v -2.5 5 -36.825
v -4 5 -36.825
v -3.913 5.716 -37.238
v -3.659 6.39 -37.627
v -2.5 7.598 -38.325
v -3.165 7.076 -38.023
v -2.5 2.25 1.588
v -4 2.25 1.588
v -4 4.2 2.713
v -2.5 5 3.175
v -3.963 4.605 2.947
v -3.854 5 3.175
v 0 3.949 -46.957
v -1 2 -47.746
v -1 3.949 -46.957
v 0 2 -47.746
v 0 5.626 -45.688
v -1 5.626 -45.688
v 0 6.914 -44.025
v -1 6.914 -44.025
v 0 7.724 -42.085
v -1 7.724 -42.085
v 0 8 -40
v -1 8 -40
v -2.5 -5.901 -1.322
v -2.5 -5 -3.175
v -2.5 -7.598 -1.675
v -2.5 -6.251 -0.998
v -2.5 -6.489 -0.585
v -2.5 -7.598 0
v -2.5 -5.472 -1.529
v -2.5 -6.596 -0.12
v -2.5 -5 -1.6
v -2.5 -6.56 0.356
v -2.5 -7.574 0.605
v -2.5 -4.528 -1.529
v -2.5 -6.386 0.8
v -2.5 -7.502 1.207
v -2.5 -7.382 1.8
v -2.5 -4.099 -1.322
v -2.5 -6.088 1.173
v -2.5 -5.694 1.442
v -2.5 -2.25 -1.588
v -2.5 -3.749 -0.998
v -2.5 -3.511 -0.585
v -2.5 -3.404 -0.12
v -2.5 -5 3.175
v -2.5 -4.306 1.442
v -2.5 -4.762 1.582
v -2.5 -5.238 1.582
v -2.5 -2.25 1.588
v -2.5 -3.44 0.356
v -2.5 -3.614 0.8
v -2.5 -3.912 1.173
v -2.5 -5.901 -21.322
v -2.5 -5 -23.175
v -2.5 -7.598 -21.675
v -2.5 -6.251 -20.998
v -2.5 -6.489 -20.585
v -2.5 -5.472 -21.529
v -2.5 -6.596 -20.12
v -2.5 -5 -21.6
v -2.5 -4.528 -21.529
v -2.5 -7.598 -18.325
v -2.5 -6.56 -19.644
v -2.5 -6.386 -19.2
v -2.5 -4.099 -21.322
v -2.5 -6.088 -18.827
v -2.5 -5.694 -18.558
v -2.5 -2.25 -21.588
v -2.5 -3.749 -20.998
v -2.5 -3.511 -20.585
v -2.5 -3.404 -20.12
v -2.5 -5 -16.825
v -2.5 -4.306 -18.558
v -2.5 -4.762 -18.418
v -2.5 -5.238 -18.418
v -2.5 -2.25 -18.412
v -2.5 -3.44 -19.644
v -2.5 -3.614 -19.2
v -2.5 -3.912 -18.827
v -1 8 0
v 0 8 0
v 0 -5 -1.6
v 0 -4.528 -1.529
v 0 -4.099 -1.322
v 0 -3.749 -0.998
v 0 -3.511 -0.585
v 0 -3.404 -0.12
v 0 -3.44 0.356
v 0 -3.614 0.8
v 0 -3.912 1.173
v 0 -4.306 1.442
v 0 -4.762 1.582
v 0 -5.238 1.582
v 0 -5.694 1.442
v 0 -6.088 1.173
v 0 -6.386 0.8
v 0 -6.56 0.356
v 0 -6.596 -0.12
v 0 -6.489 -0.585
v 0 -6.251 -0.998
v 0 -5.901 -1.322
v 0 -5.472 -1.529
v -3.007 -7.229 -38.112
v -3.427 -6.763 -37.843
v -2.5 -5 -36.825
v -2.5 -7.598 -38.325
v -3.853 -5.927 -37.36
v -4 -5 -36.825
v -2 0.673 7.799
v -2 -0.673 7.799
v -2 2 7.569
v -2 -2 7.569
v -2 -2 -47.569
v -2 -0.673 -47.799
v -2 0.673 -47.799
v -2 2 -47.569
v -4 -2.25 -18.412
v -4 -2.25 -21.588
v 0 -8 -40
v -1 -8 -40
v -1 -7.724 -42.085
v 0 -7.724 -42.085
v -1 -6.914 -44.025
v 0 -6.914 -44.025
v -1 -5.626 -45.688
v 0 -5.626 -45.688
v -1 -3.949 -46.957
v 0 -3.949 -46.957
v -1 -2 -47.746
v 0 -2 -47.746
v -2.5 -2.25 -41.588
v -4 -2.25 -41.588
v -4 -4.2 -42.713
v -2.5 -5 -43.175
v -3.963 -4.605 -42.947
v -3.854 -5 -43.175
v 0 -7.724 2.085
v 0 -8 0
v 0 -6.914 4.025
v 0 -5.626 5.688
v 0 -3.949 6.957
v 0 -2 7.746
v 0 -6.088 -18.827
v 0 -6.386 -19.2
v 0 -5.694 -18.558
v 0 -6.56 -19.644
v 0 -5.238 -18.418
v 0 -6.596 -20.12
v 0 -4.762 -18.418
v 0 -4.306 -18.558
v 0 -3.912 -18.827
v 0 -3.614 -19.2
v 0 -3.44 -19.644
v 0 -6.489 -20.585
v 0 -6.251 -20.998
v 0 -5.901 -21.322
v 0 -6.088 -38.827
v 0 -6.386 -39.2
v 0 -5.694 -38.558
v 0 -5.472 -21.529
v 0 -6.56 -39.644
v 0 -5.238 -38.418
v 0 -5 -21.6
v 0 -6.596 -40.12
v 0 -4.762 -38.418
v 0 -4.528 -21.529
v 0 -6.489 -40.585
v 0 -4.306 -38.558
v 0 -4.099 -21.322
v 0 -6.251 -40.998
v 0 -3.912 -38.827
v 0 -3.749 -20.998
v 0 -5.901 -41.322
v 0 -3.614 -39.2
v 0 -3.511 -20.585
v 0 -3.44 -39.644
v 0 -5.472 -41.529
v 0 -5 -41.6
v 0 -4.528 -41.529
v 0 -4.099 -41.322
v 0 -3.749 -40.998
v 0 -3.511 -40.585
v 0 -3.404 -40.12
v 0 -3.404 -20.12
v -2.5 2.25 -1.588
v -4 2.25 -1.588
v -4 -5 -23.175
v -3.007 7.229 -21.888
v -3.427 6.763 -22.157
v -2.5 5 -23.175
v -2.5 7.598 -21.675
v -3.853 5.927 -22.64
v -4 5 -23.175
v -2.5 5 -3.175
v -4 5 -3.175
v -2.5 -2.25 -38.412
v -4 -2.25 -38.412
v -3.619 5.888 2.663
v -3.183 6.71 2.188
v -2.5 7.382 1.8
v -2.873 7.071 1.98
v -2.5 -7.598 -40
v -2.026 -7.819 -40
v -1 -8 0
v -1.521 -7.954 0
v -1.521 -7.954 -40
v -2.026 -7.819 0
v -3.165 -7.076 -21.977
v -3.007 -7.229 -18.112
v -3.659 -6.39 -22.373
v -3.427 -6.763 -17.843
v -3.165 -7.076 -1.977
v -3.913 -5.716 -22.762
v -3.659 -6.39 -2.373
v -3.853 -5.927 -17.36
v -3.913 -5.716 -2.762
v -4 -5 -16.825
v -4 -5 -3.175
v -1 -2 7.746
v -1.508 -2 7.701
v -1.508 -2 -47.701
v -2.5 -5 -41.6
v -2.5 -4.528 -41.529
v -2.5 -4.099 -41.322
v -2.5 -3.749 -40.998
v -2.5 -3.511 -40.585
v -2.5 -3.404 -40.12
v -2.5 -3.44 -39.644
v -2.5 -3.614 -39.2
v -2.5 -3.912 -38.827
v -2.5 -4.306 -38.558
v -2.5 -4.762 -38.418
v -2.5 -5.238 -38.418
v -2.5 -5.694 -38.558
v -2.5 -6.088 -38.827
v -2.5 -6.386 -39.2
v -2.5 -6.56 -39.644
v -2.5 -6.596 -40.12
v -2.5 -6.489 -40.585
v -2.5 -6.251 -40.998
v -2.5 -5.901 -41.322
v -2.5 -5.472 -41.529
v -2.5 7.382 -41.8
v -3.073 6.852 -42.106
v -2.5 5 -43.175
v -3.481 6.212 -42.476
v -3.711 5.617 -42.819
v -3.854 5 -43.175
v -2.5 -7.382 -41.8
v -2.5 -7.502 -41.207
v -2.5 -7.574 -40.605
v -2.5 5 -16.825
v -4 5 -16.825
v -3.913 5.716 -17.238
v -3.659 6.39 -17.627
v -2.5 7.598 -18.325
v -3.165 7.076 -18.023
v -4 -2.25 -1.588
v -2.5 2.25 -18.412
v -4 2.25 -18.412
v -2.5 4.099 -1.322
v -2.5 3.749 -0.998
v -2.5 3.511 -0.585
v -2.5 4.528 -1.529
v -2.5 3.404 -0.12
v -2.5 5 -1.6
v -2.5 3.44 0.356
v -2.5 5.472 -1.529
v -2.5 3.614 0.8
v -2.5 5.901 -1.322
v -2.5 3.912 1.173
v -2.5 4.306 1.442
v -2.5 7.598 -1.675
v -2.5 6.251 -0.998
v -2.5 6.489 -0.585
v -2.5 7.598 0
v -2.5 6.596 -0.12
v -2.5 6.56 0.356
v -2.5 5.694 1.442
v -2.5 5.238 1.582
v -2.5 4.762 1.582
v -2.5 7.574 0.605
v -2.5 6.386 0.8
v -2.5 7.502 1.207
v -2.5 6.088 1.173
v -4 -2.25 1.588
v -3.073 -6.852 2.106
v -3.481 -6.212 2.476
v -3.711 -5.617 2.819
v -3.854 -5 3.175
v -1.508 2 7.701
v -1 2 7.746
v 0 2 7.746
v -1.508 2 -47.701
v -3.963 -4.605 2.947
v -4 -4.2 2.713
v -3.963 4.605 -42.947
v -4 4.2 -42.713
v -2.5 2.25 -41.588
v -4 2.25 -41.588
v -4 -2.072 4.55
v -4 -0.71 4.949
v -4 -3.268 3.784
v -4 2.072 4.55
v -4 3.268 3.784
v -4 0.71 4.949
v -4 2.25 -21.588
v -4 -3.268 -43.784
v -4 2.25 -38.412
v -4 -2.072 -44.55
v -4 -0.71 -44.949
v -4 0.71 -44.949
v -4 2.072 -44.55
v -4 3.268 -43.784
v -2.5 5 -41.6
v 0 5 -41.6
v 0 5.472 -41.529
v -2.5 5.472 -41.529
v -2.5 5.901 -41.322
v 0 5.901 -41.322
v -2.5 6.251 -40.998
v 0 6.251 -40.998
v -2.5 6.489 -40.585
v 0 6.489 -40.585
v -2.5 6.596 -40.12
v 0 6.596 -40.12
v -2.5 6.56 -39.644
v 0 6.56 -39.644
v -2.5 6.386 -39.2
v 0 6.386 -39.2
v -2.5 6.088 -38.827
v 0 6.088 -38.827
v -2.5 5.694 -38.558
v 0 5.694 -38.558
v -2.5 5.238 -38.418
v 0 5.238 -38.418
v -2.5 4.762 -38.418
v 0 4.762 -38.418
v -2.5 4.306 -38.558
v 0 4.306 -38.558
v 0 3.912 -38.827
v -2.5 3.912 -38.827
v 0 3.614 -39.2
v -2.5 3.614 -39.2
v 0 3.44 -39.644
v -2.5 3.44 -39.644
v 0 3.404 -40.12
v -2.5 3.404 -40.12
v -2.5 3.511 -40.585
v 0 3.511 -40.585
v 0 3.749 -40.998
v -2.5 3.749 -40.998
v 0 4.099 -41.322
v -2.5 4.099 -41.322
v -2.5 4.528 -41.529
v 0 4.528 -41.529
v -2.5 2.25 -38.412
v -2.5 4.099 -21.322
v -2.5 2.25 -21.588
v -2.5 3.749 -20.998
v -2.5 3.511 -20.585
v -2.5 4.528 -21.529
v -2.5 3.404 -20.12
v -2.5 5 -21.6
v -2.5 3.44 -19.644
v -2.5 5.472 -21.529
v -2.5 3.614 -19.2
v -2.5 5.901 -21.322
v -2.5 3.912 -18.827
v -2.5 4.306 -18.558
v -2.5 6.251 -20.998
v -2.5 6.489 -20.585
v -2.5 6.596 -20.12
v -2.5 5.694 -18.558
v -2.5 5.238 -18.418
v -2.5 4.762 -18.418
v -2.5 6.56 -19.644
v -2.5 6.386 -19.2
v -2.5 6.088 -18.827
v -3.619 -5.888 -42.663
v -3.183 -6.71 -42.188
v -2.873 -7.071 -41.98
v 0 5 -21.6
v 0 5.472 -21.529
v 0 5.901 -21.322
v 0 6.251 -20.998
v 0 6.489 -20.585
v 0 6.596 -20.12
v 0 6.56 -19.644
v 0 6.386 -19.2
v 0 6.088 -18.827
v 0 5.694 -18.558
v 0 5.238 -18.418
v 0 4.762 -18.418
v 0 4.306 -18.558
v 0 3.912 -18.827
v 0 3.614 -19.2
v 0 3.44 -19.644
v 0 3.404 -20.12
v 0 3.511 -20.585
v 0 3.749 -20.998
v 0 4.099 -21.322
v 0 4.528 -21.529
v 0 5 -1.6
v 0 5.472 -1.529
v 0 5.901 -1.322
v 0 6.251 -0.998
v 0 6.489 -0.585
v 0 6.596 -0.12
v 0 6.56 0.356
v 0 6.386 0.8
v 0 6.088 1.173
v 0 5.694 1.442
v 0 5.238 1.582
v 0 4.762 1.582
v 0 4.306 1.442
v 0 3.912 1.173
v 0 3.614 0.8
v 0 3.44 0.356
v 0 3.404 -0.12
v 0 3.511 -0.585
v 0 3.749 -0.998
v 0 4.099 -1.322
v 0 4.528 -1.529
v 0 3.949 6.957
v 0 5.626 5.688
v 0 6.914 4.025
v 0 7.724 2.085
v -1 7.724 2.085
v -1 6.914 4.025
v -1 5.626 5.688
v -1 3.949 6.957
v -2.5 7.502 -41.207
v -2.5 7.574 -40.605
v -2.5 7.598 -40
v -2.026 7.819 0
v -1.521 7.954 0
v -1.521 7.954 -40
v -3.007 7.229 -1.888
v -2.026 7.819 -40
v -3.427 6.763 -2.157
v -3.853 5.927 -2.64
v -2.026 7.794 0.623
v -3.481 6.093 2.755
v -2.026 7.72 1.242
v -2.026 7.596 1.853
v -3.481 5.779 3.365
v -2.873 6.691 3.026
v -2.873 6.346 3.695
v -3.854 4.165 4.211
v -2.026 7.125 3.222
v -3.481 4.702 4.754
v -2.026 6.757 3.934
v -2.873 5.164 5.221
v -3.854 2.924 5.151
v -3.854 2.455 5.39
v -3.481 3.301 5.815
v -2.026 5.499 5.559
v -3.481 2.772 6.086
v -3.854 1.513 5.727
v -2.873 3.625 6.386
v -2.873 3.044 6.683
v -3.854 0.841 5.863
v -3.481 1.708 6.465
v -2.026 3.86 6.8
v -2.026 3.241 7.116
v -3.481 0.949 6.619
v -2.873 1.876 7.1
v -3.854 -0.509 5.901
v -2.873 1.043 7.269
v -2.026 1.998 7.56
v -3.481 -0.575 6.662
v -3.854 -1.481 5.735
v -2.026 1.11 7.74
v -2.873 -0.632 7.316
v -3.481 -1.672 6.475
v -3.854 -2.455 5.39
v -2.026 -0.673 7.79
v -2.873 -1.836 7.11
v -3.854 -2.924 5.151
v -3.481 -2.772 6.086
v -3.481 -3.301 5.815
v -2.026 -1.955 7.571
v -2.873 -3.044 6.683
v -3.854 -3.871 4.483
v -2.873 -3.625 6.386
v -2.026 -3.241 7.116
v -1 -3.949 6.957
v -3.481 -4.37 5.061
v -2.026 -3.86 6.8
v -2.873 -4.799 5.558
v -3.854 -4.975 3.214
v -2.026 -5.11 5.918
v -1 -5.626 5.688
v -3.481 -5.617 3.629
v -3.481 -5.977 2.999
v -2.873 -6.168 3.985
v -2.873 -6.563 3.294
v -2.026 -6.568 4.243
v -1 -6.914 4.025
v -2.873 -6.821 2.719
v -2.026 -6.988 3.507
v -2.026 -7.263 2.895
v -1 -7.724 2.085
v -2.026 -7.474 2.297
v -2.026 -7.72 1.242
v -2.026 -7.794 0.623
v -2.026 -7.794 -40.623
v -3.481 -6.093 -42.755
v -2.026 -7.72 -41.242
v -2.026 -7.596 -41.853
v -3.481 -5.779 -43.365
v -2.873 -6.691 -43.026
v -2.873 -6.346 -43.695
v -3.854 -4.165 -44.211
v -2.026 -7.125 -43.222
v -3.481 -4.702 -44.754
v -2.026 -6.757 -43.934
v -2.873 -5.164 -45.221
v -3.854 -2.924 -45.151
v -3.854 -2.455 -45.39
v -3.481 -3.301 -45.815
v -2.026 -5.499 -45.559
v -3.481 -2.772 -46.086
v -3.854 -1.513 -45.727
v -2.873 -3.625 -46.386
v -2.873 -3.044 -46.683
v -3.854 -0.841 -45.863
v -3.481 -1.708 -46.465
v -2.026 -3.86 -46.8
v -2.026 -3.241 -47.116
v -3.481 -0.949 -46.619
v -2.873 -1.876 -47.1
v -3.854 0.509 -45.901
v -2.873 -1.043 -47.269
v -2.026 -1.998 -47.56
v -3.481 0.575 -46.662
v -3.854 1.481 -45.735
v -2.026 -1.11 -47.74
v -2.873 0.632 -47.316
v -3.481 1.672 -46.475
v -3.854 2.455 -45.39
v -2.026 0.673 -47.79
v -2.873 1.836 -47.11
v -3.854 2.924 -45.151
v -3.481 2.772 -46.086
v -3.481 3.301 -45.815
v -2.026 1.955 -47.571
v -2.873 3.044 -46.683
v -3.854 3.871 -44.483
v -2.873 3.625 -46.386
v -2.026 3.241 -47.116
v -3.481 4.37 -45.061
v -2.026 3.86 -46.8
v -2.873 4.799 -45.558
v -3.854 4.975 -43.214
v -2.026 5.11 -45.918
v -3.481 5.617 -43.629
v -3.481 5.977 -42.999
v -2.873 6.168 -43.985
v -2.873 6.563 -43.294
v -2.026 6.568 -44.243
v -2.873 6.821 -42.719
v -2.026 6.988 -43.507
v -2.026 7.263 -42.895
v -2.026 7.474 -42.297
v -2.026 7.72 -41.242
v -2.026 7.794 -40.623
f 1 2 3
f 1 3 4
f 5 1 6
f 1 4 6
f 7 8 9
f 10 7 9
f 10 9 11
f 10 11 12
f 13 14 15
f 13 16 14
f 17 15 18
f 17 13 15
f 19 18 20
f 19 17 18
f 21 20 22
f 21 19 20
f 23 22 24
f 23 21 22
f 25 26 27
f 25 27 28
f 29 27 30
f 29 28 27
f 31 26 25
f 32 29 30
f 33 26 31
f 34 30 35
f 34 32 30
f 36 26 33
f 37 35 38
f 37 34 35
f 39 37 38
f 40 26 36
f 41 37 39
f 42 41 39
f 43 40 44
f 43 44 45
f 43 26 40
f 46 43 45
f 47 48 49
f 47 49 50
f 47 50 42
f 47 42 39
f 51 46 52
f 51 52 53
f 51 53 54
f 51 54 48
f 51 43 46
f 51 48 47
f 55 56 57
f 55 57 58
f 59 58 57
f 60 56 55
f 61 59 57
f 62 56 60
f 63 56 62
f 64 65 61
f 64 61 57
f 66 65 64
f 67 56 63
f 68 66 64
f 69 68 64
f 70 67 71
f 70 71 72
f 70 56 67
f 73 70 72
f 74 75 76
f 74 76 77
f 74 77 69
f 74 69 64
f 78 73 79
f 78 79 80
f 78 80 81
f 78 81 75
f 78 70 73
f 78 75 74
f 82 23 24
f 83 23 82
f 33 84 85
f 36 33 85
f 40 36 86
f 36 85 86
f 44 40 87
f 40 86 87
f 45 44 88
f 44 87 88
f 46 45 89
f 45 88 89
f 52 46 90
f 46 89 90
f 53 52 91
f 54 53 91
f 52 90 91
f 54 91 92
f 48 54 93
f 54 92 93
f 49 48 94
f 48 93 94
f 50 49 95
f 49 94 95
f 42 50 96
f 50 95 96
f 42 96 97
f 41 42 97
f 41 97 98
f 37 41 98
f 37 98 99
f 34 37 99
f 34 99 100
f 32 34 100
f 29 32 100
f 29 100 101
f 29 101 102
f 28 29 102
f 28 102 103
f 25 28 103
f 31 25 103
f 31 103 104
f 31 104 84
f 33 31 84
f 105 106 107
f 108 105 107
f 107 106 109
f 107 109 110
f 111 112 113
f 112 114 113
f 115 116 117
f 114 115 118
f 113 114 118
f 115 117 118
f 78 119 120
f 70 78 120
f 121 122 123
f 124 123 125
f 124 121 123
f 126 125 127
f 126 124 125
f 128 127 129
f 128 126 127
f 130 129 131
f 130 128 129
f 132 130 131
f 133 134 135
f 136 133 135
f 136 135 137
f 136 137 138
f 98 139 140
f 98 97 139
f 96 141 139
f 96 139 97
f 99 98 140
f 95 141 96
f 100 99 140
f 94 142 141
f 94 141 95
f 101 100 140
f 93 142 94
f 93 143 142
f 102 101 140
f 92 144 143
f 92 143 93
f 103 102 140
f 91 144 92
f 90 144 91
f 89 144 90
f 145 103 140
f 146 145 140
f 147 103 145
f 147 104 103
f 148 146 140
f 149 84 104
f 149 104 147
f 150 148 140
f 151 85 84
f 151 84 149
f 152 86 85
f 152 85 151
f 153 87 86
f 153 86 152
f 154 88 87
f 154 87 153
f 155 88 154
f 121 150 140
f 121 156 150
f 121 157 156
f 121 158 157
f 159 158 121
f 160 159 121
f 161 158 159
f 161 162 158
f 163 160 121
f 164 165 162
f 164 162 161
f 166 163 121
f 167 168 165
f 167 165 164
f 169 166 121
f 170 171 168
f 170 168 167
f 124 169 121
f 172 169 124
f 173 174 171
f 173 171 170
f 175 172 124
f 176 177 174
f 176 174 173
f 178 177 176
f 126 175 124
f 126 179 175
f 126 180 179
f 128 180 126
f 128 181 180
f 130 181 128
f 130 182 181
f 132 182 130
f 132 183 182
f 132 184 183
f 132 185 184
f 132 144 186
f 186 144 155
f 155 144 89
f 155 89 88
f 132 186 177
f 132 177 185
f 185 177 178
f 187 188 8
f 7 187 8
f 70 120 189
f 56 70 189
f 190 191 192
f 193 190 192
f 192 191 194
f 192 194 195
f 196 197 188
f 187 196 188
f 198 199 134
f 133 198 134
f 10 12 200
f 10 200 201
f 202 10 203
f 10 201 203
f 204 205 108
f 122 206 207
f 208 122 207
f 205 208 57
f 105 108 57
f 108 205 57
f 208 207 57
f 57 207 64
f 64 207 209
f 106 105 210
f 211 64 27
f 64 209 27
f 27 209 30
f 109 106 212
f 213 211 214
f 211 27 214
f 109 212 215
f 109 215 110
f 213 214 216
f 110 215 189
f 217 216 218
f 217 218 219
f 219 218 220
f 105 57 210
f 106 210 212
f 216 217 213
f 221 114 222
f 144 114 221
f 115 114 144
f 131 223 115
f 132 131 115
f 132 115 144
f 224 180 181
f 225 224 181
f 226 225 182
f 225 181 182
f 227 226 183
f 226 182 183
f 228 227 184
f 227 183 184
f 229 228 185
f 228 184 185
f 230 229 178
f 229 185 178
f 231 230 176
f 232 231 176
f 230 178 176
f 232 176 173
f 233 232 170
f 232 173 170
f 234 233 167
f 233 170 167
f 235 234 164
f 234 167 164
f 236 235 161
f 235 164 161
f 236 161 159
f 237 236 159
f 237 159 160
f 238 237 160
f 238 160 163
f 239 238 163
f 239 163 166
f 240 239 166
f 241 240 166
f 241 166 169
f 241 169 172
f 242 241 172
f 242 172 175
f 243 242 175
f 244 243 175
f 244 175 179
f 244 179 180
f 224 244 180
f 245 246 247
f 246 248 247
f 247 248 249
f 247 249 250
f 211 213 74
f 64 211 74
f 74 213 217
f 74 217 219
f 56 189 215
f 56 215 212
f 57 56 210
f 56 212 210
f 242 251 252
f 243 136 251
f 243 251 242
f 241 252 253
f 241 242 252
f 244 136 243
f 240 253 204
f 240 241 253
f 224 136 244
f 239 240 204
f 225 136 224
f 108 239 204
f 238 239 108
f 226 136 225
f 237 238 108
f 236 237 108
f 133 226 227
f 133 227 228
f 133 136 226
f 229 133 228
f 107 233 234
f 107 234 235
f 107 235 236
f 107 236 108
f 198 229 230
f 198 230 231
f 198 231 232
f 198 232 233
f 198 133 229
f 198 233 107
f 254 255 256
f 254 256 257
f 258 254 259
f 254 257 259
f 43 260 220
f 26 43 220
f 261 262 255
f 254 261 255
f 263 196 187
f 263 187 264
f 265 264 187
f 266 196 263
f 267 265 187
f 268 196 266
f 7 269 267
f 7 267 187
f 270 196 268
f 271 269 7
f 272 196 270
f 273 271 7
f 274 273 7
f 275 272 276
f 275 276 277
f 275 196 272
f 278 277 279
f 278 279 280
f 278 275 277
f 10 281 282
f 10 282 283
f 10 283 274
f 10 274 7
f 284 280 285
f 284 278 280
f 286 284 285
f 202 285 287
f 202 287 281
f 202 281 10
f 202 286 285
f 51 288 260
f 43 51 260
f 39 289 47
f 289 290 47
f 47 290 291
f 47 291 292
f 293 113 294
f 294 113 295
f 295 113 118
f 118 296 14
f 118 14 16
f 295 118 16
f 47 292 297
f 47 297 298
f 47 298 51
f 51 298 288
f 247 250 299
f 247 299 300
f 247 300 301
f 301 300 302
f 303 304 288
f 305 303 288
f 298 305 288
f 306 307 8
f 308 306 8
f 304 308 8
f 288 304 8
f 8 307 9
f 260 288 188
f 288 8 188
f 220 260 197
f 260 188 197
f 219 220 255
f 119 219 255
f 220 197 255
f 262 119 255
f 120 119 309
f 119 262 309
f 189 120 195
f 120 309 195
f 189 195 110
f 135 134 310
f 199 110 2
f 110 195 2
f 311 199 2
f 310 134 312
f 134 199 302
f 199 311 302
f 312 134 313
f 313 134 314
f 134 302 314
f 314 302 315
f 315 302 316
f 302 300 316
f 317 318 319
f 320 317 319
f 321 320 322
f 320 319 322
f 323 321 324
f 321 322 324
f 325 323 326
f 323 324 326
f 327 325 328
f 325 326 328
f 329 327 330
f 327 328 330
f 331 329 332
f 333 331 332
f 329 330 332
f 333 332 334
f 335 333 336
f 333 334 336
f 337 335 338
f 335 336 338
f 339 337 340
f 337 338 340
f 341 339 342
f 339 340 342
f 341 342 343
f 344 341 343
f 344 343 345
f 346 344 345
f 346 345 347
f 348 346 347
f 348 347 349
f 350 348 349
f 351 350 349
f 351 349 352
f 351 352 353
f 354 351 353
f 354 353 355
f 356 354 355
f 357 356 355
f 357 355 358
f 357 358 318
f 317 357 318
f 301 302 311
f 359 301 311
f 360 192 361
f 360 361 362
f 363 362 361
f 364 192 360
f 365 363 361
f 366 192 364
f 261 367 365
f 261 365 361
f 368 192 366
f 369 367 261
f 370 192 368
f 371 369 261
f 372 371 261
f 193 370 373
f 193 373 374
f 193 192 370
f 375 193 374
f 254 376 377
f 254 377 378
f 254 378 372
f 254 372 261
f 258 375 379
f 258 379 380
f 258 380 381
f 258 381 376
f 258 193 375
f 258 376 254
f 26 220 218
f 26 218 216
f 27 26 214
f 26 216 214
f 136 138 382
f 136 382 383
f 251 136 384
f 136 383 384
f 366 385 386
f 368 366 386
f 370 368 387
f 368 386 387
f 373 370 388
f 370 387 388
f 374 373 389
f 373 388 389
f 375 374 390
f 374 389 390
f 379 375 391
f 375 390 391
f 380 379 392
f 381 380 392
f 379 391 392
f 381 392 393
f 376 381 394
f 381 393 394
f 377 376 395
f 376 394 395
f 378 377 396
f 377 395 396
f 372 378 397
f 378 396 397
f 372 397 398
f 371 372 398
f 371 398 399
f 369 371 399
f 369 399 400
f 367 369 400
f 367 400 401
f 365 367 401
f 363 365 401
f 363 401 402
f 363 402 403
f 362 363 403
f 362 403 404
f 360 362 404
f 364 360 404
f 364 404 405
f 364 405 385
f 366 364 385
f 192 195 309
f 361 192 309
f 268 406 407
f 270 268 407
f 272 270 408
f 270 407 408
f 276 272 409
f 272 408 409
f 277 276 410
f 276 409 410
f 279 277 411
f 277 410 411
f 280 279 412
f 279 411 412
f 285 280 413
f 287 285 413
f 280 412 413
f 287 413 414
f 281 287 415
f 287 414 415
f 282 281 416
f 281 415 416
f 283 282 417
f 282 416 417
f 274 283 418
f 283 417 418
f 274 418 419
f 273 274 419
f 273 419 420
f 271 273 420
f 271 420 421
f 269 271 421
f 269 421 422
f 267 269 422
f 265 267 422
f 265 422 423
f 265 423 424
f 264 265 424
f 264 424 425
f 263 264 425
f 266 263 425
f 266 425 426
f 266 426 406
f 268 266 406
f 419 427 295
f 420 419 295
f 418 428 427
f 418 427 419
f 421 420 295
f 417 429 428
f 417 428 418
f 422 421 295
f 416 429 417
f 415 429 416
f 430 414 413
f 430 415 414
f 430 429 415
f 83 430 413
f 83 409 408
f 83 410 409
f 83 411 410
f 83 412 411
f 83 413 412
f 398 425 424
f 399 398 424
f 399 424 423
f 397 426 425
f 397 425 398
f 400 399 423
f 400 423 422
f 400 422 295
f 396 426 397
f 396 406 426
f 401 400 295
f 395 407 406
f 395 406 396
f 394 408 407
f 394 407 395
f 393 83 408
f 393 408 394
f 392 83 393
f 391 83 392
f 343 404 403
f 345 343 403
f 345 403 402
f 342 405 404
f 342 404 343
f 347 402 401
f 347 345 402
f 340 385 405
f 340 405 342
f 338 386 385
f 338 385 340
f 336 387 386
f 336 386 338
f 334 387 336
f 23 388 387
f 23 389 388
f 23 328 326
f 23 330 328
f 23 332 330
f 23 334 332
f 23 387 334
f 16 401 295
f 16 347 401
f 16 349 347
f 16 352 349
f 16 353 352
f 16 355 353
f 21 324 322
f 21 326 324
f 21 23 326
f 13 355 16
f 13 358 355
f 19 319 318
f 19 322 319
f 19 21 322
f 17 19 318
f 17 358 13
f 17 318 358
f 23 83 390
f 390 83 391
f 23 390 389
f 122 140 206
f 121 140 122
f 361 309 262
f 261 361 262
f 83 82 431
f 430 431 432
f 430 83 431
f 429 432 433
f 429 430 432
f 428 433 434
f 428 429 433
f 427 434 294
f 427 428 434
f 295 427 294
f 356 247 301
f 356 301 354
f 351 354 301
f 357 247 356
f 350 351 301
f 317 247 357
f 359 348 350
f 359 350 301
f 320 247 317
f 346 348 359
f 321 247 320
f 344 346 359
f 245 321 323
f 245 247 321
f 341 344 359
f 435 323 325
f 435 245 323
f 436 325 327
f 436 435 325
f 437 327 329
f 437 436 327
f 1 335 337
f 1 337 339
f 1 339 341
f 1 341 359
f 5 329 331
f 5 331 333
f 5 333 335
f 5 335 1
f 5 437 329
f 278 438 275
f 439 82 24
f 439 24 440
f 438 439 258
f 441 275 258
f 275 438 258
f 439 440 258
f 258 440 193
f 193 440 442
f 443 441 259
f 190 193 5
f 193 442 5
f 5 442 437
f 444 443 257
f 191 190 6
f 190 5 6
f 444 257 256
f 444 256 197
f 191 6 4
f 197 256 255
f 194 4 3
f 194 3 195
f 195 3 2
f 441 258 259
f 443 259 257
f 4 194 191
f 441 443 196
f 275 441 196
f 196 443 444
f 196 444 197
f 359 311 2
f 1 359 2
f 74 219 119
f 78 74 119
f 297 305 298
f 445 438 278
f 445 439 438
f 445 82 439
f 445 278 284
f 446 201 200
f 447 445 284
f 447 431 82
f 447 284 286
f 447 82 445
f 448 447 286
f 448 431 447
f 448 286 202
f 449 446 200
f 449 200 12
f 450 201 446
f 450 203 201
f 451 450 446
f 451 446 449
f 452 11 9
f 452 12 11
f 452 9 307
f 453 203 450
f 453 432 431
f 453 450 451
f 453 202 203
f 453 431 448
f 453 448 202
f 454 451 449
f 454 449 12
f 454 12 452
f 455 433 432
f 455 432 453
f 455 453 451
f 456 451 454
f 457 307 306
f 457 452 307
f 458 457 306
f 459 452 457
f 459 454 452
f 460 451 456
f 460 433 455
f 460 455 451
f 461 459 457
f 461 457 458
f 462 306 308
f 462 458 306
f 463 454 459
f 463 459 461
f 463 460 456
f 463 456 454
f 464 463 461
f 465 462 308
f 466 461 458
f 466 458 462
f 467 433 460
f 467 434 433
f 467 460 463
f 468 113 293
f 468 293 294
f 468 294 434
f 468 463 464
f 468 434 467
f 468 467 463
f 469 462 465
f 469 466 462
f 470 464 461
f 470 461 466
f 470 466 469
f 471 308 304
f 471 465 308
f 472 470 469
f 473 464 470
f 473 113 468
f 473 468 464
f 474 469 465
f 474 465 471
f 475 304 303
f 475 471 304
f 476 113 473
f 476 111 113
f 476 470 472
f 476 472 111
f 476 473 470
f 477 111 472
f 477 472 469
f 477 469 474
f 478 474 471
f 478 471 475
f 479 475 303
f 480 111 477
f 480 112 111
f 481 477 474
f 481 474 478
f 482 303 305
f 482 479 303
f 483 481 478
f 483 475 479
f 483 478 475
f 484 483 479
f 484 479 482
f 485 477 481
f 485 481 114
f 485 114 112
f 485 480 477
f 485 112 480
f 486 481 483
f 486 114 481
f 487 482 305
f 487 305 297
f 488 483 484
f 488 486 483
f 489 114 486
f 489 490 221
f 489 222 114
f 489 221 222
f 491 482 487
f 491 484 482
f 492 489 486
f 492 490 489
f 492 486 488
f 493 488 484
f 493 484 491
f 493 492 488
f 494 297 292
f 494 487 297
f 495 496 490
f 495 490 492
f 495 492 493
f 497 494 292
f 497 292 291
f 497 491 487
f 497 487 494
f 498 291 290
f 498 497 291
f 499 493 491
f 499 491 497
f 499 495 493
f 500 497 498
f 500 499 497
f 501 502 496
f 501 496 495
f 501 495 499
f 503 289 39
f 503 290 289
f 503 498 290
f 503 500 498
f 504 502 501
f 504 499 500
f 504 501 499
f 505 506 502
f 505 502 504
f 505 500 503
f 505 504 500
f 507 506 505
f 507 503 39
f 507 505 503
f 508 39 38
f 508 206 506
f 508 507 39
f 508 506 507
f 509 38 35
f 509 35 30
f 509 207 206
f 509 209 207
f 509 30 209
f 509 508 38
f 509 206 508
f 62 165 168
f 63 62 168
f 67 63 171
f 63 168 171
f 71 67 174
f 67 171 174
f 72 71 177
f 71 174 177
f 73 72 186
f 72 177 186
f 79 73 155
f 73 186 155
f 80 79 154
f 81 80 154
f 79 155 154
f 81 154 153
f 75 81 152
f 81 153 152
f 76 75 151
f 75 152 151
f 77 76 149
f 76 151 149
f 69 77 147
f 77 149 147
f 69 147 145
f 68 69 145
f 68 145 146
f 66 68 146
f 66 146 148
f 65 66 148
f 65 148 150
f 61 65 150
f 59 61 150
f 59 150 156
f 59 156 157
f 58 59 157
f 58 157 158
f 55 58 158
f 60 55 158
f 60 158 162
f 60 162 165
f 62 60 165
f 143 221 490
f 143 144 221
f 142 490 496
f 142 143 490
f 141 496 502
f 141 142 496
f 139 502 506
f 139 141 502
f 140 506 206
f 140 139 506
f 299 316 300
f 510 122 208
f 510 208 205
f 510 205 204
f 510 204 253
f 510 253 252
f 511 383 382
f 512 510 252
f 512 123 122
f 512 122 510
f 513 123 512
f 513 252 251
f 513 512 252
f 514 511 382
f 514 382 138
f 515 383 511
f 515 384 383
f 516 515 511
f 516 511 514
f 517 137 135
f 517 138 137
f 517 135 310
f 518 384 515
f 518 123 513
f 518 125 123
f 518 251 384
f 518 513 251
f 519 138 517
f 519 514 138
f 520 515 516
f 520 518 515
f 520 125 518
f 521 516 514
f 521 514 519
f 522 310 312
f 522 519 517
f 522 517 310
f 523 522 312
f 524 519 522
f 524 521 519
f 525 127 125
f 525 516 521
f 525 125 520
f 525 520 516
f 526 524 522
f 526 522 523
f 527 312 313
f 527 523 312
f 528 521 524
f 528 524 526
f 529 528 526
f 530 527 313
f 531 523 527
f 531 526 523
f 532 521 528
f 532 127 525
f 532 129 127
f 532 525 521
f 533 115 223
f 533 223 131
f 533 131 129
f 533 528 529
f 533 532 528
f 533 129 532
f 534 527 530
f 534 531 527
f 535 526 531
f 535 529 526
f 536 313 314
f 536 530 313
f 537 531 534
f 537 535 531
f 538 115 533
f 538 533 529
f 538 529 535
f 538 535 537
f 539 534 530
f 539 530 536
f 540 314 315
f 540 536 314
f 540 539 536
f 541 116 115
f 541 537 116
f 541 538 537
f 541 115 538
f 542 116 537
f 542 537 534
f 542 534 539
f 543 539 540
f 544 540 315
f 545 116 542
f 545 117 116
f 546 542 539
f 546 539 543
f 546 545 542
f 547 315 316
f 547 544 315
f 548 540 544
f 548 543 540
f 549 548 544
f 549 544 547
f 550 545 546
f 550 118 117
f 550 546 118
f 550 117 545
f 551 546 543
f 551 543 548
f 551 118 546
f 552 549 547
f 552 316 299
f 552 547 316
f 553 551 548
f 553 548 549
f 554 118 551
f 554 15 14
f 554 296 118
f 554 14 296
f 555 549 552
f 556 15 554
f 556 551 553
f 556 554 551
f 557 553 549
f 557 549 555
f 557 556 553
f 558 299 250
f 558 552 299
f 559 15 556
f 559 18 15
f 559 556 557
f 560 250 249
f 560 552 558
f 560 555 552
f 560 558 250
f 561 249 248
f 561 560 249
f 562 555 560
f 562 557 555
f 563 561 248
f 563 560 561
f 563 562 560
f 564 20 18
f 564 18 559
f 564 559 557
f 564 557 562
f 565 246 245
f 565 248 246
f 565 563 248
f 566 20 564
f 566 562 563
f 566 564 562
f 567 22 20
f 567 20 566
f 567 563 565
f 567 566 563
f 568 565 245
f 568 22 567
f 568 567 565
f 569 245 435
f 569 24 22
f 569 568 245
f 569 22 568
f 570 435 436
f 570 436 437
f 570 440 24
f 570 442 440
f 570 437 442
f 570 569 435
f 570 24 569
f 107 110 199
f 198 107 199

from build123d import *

# Parameters (mm, degrees)
BOSS_EXTRUDE1_DEPTH     = 4
CUT_EXTRUDE1_DEPTH      = 49.826222463
CUT_EXTRUDE1_DEPTH_BACK = 49.826222463
SKETCH2_W               = 2
SKETCH2_H               = 4
CUT_EXTRUDE2_REACH      = 50.826
SKETCH3_R               = 1.6
FILLET1_R               = 3
CUT_EXTRUDE3_DEPTH      = 1.5


with BuildPart() as part:
    # Sketch1 → Boss-Extrude1 (new body)
    with BuildSketch(Plane(origin=(0, 0, 0), x_dir=(0, 0, -1), z_dir=(1, 0, 0))):
        with BuildLine():
            Line((0, -8), (40, -8))
            ThreePointArc((40, -8), (48, 0), (40, 8))
            Line((40, 8), (0, 8))
            ThreePointArc((0, 8), (-8, 0), (0, -8))
        make_face()
    extrude(amount=-BOSS_EXTRUDE1_DEPTH)

    # Sketch2 → Cut-Extrude1 (cut, two sides: drawn at the far end of the back side and taken through both)
    with BuildSketch(Plane.XY.offset(-CUT_EXTRUDE1_DEPTH_BACK)):
        with Locations((-1, 0)):
            Rectangle(SKETCH2_W, SKETCH2_H)
    extrude(amount=CUT_EXTRUDE1_DEPTH + CUT_EXTRUDE1_DEPTH_BACK, mode=Mode.SUBTRACT)

    # Sketch3 → Cut-Extrude2 (cut, up to next)
    with BuildSketch(Plane(origin=(0, 0, 0), x_dir=(0, 0, -1), z_dir=(1, 0, 0)), mode=Mode.PRIVATE) as cut_extrude2_sk1:
        with Locations((0, 5)):
            Circle(SKETCH3_R)
    cut_extrude2_tool1 = extrude(cut_extrude2_sk1.sketch, amount=-CUT_EXTRUDE2_REACH, mode=Mode.PRIVATE) & part.part
    # Sketch3 → Cut-Extrude2 (cut, up to next)
    with BuildSketch(Plane(origin=(0, 0, 0), x_dir=(0, 0, -1), z_dir=(1, 0, 0)), mode=Mode.PRIVATE) as cut_extrude2_sk2:
        with Locations((40, 5)):
            Circle(SKETCH3_R)
    cut_extrude2_tool2 = extrude(cut_extrude2_sk2.sketch, amount=-CUT_EXTRUDE2_REACH, mode=Mode.PRIVATE) & part.part
    # Sketch3 → Cut-Extrude2 (cut, up to next)
    with BuildSketch(Plane(origin=(0, 0, 0), x_dir=(0, 0, -1), z_dir=(1, 0, 0)), mode=Mode.PRIVATE) as cut_extrude2_sk3:
        with Locations((40, -5)):
            Circle(SKETCH3_R)
    cut_extrude2_tool3 = extrude(cut_extrude2_sk3.sketch, amount=-CUT_EXTRUDE2_REACH, mode=Mode.PRIVATE) & part.part
    # Sketch3 → Cut-Extrude2 (cut, up to next)
    with BuildSketch(Plane(origin=(0, 0, 0), x_dir=(0, 0, -1), z_dir=(1, 0, 0)), mode=Mode.PRIVATE) as cut_extrude2_sk4:
        with Locations((0, -5)):
            Circle(SKETCH3_R)
    cut_extrude2_tool4 = extrude(cut_extrude2_sk4.sketch, amount=-CUT_EXTRUDE2_REACH, mode=Mode.PRIVATE) & part.part
    # Sketch3 → Cut-Extrude2 (cut, up to next)
    with BuildSketch(Plane(origin=(0, 0, 0), x_dir=(0, 0, -1), z_dir=(1, 0, 0)), mode=Mode.PRIVATE) as cut_extrude2_sk5:
        with Locations((20, 5)):
            Circle(SKETCH3_R)
    cut_extrude2_tool5 = extrude(cut_extrude2_sk5.sketch, amount=-CUT_EXTRUDE2_REACH, mode=Mode.PRIVATE) & part.part
    # Sketch3 → Cut-Extrude2 (cut, up to next)
    with BuildSketch(Plane(origin=(0, 0, 0), x_dir=(0, 0, -1), z_dir=(1, 0, 0)), mode=Mode.PRIVATE) as cut_extrude2_sk6:
        with Locations((20, -5)):
            Circle(SKETCH3_R)
    cut_extrude2_tool6 = extrude(cut_extrude2_sk6.sketch, amount=-CUT_EXTRUDE2_REACH, mode=Mode.PRIVATE) & part.part
    add(cut_extrude2_tool1.solids().sort_by_distance((0, 5, 0))[0], mode=Mode.SUBTRACT)
    add(cut_extrude2_tool2.solids().sort_by_distance((0, 5, -40))[0], mode=Mode.SUBTRACT)
    add(cut_extrude2_tool3.solids().sort_by_distance((0, -5, -40))[0], mode=Mode.SUBTRACT)
    add(cut_extrude2_tool4.solids().sort_by_distance((0, -5, 0))[0], mode=Mode.SUBTRACT)
    add(cut_extrude2_tool5.solids().sort_by_distance((0, 5, -20))[0], mode=Mode.SUBTRACT)
    add(cut_extrude2_tool6.solids().sort_by_distance((0, -5, -20))[0], mode=Mode.SUBTRACT)

    # Fillet1
    # the kernel refuses this fillet: 3 mm, written as the material it takes off along each edge
    with BuildSketch(Plane(origin=(-4, -8, 0), x_dir=(0, 1, 0), z_dir=(0, 0, -1))) as fillet1_piece_1:
        with BuildLine():
            CenterArc((FILLET1_R, FILLET1_R), FILLET1_R, 180, 90)
            Line((0, FILLET1_R), (0, 0))
            Line((0, 0), (FILLET1_R, 0))
        make_face()
    extrude(amount=40, mode=Mode.SUBTRACT)
    with BuildSketch(Plane(origin=(-4, 0, 0), x_dir=(0, 1, 0), z_dir=(0, 0, -1))) as fillet1_piece_2:
        with BuildLine():
            CenterArc((8 - FILLET1_R, FILLET1_R), FILLET1_R, 270, 90)
            Line((8 - FILLET1_R, 0), (8, 0))
            Line((8, 0), (8, FILLET1_R))
        make_face()
    revolve(axis=Axis((-4, 0, 0), (1, 0, 0)), revolution_arc=180, mode=Mode.SUBTRACT)
    with BuildSketch(Plane(origin=(-4, 8, -40), x_dir=(1, 0, 0), z_dir=(0, 0, 1))) as fillet1_piece_3:
        with BuildLine():
            CenterArc((FILLET1_R, -FILLET1_R), FILLET1_R, 90, 90)
            Line((0, -FILLET1_R), (0, 0))
            Line((0, 0), (FILLET1_R, 0))
        make_face()
    extrude(amount=40, mode=Mode.SUBTRACT)
    with BuildSketch(Plane(origin=(-4, 0, -40), x_dir=(0, -1, 0), z_dir=(0, 0, 1))) as fillet1_piece_4:
        with BuildLine():
            CenterArc((8 - FILLET1_R, FILLET1_R), FILLET1_R, 270, 90)
            Line((8 - FILLET1_R, 0), (8, 0))
            Line((8, 0), (8, FILLET1_R))
        make_face()
    revolve(axis=Axis((-4, 0, -40), (1, 0, 0)), revolution_arc=180, mode=Mode.SUBTRACT)

    # Sketch4 → Cut-Extrude3 (cut)
    with BuildSketch(Plane.ZY.offset(4)):
        Polygon((-36.824573519, 5), (-38.41228676, 7.75), (-41.58771324, 7.75), (-43.175426481, 5), (-41.58771324, 2.25), (-38.41228676, 2.25), align=None)
        Polygon((-3.175426481, 5), (-1.58771324, 2.25), (1.58771324, 2.25), (3.175426481, 5), (1.58771324, 7.75), (-1.58771324, 7.75), align=None)
        Polygon((-3.175426481, -5), (-1.58771324, -7.75), (1.58771324, -7.75), (3.175426481, -5), (1.58771324, -2.25), (-1.58771324, -2.25), align=None)
        Polygon((-36.824573519, -5), (-38.41228676, -2.25), (-41.58771324, -2.25), (-43.175426481, -5), (-41.58771324, -7.75), (-38.41228676, -7.75), align=None)
        Polygon((-16.824573519, 5), (-18.41228676, 7.75), (-21.58771324, 7.75), (-23.175426481, 5), (-21.58771324, 2.25), (-18.41228676, 2.25), align=None)
        Polygon((-16.824573519, -5), (-18.41228676, -2.25), (-21.58771324, -2.25), (-23.175426481, -5), (-21.58771324, -7.75), (-18.41228676, -7.75), align=None)
    extrude(amount=-CUT_EXTRUDE3_DEPTH, mode=Mode.SUBTRACT)


solid = part.part
